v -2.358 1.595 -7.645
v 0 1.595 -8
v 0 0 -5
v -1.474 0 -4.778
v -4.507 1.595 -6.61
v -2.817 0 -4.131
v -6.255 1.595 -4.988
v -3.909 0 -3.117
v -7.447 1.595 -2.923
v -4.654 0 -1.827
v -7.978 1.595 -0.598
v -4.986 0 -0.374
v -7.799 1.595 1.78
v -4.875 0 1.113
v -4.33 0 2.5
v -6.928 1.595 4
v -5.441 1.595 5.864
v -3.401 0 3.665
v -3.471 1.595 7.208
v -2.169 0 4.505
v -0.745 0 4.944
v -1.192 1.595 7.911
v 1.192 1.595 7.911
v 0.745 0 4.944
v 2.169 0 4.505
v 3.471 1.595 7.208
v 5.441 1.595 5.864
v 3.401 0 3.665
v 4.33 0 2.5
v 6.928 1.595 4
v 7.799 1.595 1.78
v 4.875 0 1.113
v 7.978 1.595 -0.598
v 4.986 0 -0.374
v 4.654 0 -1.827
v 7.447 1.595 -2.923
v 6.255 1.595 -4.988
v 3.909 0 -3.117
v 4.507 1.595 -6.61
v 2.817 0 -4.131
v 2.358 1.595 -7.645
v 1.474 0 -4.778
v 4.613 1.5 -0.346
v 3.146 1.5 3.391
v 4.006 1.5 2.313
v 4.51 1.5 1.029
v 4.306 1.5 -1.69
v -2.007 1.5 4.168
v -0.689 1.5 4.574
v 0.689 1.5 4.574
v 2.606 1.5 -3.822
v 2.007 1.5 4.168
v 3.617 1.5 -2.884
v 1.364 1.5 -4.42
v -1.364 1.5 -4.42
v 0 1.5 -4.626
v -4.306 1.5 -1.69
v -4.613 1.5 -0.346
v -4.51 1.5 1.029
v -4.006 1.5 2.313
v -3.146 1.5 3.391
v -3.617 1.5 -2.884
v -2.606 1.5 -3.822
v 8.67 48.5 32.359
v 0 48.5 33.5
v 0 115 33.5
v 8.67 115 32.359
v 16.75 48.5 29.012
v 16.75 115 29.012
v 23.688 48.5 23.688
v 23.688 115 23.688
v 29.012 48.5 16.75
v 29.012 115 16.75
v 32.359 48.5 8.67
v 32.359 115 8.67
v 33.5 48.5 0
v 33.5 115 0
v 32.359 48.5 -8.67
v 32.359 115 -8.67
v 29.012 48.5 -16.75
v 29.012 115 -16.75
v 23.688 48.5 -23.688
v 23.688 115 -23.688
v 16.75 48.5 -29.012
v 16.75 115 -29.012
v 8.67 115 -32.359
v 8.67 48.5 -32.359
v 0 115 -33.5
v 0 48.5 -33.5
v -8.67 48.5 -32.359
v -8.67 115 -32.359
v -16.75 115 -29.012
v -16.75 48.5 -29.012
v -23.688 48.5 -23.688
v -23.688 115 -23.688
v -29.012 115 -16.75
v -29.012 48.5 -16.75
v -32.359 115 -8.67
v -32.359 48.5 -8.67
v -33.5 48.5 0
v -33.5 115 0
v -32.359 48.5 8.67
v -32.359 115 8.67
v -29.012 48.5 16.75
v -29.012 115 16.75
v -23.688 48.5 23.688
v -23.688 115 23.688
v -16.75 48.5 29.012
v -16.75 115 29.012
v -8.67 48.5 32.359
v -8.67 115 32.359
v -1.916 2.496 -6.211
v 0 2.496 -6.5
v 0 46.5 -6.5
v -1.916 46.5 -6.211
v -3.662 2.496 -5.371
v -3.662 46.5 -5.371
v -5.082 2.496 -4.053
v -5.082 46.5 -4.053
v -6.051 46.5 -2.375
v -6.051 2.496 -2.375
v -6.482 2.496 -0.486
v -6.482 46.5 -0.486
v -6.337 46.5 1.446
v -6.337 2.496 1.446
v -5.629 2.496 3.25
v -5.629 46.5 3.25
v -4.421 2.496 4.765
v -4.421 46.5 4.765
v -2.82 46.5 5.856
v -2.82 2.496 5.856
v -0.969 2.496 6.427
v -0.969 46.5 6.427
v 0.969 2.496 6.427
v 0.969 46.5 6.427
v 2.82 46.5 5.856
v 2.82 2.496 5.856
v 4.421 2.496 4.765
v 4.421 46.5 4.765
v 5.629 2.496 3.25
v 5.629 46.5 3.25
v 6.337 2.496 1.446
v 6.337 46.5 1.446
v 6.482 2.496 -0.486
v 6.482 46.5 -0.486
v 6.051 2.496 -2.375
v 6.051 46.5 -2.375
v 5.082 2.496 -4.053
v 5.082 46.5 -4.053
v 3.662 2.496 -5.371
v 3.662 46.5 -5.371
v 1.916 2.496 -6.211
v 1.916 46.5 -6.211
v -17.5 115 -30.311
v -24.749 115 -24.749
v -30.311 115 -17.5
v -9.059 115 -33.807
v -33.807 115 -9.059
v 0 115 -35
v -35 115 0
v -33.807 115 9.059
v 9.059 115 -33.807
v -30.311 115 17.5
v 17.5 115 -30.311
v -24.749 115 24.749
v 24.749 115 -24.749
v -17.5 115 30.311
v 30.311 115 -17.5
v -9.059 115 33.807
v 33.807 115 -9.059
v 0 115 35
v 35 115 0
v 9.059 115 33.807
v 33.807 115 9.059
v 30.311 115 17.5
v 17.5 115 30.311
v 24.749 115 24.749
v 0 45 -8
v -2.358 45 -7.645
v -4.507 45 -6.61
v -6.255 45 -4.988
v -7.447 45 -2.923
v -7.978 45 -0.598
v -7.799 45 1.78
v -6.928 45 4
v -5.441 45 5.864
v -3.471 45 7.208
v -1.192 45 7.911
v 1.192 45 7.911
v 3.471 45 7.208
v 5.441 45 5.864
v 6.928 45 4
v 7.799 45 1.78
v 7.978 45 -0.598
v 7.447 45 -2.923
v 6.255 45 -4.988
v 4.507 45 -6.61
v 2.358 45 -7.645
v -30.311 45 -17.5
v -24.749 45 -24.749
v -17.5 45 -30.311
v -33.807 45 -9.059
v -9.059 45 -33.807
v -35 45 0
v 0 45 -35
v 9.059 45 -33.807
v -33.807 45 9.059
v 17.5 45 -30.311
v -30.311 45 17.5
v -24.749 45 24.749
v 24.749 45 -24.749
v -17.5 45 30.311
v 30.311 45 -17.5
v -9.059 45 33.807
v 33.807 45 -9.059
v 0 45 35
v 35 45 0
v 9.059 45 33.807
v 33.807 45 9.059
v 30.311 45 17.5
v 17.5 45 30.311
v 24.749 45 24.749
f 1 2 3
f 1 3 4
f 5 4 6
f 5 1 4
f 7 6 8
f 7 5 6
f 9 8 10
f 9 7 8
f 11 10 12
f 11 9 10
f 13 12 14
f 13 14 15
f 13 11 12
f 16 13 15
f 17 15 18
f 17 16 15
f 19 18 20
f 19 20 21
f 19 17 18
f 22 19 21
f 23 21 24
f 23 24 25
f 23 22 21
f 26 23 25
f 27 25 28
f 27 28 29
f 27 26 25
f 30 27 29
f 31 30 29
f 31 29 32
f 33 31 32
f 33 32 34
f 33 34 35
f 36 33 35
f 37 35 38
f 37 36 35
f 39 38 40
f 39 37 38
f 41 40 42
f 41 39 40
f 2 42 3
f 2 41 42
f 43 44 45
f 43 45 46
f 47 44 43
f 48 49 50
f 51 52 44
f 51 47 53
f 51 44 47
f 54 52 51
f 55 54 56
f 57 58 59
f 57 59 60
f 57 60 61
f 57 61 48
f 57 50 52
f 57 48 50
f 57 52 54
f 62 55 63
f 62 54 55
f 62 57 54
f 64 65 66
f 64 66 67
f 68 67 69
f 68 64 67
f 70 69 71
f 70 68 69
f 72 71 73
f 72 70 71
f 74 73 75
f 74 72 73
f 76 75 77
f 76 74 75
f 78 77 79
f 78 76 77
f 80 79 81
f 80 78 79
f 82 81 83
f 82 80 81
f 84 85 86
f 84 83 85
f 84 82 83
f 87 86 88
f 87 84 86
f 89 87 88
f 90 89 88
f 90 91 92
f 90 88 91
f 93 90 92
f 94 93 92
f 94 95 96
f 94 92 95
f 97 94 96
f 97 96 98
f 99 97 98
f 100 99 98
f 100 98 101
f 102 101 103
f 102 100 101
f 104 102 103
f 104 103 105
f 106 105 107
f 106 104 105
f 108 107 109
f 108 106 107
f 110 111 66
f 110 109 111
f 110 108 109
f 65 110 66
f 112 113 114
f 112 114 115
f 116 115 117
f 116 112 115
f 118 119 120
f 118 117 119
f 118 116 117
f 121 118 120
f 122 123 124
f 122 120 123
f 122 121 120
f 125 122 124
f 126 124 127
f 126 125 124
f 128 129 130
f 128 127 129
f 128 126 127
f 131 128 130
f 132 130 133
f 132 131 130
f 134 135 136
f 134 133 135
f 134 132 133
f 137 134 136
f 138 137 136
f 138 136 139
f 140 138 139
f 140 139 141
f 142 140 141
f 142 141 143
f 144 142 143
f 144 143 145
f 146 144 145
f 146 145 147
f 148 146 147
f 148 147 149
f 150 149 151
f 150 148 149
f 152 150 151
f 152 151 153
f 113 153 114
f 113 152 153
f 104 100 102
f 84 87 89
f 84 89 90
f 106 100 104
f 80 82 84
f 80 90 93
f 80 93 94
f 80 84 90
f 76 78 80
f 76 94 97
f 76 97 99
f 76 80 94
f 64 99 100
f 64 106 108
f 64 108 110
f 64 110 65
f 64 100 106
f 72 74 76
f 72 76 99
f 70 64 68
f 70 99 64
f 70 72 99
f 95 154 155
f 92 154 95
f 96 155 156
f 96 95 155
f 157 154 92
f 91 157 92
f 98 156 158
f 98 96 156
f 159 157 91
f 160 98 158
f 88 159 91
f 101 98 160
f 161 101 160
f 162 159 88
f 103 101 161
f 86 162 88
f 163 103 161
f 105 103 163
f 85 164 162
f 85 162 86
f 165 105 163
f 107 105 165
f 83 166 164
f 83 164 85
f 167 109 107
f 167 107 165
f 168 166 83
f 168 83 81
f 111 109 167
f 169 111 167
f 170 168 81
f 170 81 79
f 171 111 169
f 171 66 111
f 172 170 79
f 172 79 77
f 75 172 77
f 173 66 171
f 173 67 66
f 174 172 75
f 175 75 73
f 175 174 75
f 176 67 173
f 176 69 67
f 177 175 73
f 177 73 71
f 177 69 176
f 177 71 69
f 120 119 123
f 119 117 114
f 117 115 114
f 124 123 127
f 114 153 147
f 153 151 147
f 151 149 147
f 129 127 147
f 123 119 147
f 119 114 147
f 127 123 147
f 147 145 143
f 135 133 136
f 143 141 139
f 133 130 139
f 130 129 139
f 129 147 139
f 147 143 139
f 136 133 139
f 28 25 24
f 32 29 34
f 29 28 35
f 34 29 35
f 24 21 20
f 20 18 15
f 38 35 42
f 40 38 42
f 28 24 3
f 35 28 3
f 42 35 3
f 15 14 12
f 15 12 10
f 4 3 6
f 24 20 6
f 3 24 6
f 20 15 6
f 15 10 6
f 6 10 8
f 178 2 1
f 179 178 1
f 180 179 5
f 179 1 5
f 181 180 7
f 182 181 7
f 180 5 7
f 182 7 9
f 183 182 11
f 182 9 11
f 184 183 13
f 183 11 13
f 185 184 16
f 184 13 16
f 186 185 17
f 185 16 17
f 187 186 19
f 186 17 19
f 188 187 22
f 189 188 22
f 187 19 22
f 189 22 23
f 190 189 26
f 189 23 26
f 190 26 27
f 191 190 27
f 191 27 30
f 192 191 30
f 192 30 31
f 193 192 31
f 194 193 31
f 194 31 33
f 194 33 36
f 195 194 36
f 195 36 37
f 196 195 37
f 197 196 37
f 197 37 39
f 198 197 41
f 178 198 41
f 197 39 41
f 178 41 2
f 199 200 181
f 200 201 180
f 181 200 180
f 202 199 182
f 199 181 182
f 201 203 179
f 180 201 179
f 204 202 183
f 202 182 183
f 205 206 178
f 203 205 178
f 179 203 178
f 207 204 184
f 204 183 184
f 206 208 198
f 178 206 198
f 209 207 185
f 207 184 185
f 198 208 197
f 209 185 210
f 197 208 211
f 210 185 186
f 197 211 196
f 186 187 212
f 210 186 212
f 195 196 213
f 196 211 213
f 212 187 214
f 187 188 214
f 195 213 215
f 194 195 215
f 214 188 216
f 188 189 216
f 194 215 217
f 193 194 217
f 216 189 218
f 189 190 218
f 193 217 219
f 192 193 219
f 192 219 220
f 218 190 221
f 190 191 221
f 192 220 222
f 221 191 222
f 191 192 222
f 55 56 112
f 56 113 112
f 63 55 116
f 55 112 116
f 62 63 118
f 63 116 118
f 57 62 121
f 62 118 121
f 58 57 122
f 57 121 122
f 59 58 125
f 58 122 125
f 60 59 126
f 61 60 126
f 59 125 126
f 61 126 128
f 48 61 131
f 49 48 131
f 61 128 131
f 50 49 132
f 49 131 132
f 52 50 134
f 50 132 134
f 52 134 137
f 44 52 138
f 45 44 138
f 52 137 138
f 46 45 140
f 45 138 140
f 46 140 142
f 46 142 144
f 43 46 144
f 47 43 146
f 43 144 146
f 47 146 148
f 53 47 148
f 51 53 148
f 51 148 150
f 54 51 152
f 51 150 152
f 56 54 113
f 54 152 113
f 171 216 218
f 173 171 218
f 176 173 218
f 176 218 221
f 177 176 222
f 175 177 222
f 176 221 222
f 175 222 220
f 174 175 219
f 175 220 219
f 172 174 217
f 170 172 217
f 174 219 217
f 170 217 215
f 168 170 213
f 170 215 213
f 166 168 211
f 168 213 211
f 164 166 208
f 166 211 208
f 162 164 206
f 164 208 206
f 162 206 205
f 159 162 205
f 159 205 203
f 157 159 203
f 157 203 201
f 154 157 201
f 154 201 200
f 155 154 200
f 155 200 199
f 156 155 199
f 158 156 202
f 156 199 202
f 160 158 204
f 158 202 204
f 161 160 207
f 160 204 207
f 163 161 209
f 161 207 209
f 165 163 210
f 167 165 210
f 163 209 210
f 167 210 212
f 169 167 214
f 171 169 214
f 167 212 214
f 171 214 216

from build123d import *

# Parameters (mm, degrees)
SKETCH1_R           = 8
BOSS_EXTRUDE1_DEPTH = 45
CHAMFER1_SIZE       = 3
CHAMFER1_SIZE2      = 1.595128295
SKETCH2_R           = 35
BOSS_EXTRUDE2_DEPTH = 70
SHELL1_T            = -1.5
SKETCH3_R           = 33.5
BOSS_EXTRUDE3_DEPTH = 2


with BuildPart() as part:
    # Sketch1 → Boss-Extrude1 (new body)
    with BuildSketch(Plane(origin=(0, 0, 0), x_dir=(1, 0, 0), z_dir=(0, 1, 0))):
        with Locations(Location((0, 0, 0), (0, 0, 90))):
            Circle(SKETCH1_R)
    extrude(amount=BOSS_EXTRUDE1_DEPTH)

    # Chamfer1
    chamfer1_edges = [part.edges().sort_by_distance(p)[0] for p in [
        (0, 0, 8),
    ]]
    chamfer1_side = [part.faces().sort_by_distance(p)[0] for p in [
        (0, 0, 0),
    ]]
    chamfer(chamfer1_edges, length=CHAMFER1_SIZE, length2=CHAMFER1_SIZE2, reference=chamfer1_side[0])

    # Sketch2 → Boss-Extrude2 (add)
    with BuildSketch(Plane(origin=(0, 45, 0), x_dir=(1, 0, 0), z_dir=(0, 1, 0))):
        with Locations(Location((0, 0, 0), (0, 0, 270))):
            Circle(SKETCH2_R)
    extrude(amount=BOSS_EXTRUDE2_DEPTH)

    # Shell1
    shell1_openings = [part.faces().sort_by_distance(p)[0] for p in [
        (0, 115, 0),
    ]]
    offset(amount=SHELL1_T, openings=shell1_openings, kind=Kind.INTERSECTION)

    # Sketch3 → Boss-Extrude3 (add)
    with BuildSketch(Plane(origin=(0, 46.5, 0), x_dir=(1, 0, 0), z_dir=(0, 1, 0))):
        with Locations(Location((0, 0, 0), (0, 0, 270))):
            Circle(SKETCH3_R)
    extrude(amount=BOSS_EXTRUDE3_DEPTH)


solid = part.part
